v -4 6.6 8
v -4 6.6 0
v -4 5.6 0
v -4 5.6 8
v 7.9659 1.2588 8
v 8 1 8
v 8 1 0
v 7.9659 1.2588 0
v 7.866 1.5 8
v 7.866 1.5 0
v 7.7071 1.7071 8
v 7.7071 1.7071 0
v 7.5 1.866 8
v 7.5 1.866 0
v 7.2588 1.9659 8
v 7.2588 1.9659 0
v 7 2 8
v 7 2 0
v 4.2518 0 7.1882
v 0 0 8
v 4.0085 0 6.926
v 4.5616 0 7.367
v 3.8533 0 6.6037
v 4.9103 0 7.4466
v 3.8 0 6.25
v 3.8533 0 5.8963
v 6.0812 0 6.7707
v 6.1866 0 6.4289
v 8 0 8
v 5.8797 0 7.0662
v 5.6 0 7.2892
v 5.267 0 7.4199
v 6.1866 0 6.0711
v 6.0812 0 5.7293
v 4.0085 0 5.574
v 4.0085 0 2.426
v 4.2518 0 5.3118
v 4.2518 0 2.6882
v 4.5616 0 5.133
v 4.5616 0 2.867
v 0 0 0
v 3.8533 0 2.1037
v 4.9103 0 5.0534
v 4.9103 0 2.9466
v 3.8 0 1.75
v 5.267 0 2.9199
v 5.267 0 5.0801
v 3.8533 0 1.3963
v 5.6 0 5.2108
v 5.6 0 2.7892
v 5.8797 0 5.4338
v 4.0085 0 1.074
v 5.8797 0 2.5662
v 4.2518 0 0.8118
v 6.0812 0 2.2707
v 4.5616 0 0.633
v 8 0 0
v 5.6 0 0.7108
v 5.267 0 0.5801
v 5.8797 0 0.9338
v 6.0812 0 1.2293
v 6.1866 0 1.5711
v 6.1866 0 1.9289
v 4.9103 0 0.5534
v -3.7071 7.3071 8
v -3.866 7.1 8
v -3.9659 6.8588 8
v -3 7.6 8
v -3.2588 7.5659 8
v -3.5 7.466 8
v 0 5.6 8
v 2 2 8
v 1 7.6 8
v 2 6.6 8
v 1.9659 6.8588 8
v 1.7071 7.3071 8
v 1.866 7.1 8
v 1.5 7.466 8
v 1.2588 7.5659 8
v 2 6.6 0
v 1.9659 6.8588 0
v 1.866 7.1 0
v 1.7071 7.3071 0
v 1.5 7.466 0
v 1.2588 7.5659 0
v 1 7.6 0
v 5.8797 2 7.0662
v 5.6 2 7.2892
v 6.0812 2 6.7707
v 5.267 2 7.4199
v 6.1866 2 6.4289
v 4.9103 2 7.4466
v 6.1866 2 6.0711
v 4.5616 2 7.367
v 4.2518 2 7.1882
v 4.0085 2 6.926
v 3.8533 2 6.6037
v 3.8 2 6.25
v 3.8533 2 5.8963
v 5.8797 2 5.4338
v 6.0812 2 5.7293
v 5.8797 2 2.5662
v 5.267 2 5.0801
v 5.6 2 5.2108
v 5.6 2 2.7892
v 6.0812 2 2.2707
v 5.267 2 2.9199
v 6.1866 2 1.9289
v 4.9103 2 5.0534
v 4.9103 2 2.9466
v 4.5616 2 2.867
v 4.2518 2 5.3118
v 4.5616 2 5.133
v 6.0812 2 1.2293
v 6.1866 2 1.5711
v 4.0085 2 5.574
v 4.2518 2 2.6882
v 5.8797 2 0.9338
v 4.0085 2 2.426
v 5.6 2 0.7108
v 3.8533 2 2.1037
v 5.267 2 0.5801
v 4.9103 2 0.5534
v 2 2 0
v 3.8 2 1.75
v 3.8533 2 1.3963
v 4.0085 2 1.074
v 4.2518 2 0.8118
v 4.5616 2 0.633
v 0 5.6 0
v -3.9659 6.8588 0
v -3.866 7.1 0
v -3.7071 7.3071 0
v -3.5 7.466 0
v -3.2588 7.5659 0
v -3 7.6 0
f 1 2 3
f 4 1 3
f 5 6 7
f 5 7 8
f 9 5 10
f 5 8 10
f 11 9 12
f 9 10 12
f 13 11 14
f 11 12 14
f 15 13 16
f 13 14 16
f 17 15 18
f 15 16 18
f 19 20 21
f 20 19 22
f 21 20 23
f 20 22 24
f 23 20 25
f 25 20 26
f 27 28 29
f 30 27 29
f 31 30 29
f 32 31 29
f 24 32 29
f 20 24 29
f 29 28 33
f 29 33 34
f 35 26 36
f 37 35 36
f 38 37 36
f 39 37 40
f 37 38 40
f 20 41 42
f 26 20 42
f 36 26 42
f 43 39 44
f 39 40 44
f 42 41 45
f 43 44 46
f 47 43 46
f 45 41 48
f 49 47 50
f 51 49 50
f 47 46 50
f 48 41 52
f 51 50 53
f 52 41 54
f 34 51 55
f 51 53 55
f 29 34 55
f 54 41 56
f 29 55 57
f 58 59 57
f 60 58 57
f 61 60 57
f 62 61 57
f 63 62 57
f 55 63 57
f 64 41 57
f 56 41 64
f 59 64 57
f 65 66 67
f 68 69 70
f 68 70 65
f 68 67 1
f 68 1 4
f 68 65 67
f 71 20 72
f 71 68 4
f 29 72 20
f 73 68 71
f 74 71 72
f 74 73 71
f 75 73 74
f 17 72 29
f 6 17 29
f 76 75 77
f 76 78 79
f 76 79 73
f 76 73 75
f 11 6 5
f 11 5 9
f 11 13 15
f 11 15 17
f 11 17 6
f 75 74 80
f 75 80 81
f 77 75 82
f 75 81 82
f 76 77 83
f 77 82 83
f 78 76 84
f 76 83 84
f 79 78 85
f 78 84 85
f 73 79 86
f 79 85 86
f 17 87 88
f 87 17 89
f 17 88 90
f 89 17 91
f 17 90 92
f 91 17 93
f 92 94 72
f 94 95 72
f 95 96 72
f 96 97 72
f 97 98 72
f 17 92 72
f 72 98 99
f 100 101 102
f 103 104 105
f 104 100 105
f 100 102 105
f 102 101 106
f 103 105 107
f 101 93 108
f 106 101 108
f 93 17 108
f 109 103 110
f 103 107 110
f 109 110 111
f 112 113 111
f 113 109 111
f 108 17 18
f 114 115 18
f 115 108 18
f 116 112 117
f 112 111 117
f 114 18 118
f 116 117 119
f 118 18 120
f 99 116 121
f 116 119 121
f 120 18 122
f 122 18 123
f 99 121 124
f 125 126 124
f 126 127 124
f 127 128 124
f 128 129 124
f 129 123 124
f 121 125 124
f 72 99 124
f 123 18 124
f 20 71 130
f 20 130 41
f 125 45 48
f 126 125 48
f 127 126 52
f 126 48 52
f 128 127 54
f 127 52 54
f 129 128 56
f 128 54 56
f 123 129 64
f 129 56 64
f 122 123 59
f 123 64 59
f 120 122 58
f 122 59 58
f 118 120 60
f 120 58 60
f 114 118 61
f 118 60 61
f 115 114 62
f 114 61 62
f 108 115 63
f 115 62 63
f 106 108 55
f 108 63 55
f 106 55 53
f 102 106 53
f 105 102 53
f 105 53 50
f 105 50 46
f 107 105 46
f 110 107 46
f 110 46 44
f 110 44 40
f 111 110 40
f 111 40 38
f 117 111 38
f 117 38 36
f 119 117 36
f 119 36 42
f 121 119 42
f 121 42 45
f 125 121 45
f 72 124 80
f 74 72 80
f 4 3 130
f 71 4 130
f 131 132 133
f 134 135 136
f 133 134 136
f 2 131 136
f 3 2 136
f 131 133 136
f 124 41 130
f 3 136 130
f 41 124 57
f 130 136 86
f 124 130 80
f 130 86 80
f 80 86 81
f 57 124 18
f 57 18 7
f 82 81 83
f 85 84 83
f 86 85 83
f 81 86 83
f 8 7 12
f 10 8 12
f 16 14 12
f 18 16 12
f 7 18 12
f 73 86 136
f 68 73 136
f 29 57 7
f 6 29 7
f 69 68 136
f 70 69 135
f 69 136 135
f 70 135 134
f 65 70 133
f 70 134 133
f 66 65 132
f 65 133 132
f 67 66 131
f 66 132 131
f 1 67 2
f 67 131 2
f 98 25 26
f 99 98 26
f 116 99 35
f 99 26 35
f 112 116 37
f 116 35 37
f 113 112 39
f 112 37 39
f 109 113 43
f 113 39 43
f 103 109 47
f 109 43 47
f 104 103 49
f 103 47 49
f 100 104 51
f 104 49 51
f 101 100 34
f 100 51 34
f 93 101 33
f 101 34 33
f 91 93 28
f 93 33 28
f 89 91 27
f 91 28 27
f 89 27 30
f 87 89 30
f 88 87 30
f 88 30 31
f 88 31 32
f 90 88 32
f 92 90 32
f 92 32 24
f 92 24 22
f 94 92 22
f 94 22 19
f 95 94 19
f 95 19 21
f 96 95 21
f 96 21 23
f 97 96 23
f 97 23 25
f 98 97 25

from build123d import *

# Parameters (mm, degrees)
BOSS_EXTRUDE1_DEPTH  = 8
M2_CLEARANCE_HOLE2_D = 2.4
M2_CLEARANCE_HOLE1_D = 2.4


with BuildPart() as part:
    # Sketch1 → Boss-Extrude1 (new body)
    with BuildSketch(Plane.XY):
        with BuildLine():
            Line((0, 0), (8, 0))
            Line((8, 0), (8, 1))
            ThreePointArc((8, 1), (7.707106781, 1.707106781), (7, 2))
            Line((7, 2), (2, 2))
            Line((2, 2), (2, 6.6))
            ThreePointArc((2, 6.6), (1.707106781, 7.307106781), (1, 7.6))
            Line((1, 7.6), (-3, 7.6))
            ThreePointArc((-3, 7.6), (-3.707106781, 7.307106781), (-4, 6.6))
            Line((-4, 6.6), (-4, 5.6))
            Line((-4, 5.6), (0, 5.6))
            Line((0, 5.6), (0, 0))
        make_face()
    extrude(amount=BOSS_EXTRUDE1_DEPTH)

    # M2 Clearance Hole2 (through all)
    with Locations(Plane(origin=(0, 12, 0), x_dir=(1, 0, 0), z_dir=(0, 1, 0))):
        with Locations((5, -1.75)):
            Hole(M2_CLEARANCE_HOLE2_D / 2)

    # M2 Clearance Hole1 (through all)
    with Locations(Plane(origin=(0, 12, 0), x_dir=(1, 0, 0), z_dir=(0, 1, 0))):
        with Locations((5, -6.25)):
            Hole(M2_CLEARANCE_HOLE1_D / 2)


solid = part.part
